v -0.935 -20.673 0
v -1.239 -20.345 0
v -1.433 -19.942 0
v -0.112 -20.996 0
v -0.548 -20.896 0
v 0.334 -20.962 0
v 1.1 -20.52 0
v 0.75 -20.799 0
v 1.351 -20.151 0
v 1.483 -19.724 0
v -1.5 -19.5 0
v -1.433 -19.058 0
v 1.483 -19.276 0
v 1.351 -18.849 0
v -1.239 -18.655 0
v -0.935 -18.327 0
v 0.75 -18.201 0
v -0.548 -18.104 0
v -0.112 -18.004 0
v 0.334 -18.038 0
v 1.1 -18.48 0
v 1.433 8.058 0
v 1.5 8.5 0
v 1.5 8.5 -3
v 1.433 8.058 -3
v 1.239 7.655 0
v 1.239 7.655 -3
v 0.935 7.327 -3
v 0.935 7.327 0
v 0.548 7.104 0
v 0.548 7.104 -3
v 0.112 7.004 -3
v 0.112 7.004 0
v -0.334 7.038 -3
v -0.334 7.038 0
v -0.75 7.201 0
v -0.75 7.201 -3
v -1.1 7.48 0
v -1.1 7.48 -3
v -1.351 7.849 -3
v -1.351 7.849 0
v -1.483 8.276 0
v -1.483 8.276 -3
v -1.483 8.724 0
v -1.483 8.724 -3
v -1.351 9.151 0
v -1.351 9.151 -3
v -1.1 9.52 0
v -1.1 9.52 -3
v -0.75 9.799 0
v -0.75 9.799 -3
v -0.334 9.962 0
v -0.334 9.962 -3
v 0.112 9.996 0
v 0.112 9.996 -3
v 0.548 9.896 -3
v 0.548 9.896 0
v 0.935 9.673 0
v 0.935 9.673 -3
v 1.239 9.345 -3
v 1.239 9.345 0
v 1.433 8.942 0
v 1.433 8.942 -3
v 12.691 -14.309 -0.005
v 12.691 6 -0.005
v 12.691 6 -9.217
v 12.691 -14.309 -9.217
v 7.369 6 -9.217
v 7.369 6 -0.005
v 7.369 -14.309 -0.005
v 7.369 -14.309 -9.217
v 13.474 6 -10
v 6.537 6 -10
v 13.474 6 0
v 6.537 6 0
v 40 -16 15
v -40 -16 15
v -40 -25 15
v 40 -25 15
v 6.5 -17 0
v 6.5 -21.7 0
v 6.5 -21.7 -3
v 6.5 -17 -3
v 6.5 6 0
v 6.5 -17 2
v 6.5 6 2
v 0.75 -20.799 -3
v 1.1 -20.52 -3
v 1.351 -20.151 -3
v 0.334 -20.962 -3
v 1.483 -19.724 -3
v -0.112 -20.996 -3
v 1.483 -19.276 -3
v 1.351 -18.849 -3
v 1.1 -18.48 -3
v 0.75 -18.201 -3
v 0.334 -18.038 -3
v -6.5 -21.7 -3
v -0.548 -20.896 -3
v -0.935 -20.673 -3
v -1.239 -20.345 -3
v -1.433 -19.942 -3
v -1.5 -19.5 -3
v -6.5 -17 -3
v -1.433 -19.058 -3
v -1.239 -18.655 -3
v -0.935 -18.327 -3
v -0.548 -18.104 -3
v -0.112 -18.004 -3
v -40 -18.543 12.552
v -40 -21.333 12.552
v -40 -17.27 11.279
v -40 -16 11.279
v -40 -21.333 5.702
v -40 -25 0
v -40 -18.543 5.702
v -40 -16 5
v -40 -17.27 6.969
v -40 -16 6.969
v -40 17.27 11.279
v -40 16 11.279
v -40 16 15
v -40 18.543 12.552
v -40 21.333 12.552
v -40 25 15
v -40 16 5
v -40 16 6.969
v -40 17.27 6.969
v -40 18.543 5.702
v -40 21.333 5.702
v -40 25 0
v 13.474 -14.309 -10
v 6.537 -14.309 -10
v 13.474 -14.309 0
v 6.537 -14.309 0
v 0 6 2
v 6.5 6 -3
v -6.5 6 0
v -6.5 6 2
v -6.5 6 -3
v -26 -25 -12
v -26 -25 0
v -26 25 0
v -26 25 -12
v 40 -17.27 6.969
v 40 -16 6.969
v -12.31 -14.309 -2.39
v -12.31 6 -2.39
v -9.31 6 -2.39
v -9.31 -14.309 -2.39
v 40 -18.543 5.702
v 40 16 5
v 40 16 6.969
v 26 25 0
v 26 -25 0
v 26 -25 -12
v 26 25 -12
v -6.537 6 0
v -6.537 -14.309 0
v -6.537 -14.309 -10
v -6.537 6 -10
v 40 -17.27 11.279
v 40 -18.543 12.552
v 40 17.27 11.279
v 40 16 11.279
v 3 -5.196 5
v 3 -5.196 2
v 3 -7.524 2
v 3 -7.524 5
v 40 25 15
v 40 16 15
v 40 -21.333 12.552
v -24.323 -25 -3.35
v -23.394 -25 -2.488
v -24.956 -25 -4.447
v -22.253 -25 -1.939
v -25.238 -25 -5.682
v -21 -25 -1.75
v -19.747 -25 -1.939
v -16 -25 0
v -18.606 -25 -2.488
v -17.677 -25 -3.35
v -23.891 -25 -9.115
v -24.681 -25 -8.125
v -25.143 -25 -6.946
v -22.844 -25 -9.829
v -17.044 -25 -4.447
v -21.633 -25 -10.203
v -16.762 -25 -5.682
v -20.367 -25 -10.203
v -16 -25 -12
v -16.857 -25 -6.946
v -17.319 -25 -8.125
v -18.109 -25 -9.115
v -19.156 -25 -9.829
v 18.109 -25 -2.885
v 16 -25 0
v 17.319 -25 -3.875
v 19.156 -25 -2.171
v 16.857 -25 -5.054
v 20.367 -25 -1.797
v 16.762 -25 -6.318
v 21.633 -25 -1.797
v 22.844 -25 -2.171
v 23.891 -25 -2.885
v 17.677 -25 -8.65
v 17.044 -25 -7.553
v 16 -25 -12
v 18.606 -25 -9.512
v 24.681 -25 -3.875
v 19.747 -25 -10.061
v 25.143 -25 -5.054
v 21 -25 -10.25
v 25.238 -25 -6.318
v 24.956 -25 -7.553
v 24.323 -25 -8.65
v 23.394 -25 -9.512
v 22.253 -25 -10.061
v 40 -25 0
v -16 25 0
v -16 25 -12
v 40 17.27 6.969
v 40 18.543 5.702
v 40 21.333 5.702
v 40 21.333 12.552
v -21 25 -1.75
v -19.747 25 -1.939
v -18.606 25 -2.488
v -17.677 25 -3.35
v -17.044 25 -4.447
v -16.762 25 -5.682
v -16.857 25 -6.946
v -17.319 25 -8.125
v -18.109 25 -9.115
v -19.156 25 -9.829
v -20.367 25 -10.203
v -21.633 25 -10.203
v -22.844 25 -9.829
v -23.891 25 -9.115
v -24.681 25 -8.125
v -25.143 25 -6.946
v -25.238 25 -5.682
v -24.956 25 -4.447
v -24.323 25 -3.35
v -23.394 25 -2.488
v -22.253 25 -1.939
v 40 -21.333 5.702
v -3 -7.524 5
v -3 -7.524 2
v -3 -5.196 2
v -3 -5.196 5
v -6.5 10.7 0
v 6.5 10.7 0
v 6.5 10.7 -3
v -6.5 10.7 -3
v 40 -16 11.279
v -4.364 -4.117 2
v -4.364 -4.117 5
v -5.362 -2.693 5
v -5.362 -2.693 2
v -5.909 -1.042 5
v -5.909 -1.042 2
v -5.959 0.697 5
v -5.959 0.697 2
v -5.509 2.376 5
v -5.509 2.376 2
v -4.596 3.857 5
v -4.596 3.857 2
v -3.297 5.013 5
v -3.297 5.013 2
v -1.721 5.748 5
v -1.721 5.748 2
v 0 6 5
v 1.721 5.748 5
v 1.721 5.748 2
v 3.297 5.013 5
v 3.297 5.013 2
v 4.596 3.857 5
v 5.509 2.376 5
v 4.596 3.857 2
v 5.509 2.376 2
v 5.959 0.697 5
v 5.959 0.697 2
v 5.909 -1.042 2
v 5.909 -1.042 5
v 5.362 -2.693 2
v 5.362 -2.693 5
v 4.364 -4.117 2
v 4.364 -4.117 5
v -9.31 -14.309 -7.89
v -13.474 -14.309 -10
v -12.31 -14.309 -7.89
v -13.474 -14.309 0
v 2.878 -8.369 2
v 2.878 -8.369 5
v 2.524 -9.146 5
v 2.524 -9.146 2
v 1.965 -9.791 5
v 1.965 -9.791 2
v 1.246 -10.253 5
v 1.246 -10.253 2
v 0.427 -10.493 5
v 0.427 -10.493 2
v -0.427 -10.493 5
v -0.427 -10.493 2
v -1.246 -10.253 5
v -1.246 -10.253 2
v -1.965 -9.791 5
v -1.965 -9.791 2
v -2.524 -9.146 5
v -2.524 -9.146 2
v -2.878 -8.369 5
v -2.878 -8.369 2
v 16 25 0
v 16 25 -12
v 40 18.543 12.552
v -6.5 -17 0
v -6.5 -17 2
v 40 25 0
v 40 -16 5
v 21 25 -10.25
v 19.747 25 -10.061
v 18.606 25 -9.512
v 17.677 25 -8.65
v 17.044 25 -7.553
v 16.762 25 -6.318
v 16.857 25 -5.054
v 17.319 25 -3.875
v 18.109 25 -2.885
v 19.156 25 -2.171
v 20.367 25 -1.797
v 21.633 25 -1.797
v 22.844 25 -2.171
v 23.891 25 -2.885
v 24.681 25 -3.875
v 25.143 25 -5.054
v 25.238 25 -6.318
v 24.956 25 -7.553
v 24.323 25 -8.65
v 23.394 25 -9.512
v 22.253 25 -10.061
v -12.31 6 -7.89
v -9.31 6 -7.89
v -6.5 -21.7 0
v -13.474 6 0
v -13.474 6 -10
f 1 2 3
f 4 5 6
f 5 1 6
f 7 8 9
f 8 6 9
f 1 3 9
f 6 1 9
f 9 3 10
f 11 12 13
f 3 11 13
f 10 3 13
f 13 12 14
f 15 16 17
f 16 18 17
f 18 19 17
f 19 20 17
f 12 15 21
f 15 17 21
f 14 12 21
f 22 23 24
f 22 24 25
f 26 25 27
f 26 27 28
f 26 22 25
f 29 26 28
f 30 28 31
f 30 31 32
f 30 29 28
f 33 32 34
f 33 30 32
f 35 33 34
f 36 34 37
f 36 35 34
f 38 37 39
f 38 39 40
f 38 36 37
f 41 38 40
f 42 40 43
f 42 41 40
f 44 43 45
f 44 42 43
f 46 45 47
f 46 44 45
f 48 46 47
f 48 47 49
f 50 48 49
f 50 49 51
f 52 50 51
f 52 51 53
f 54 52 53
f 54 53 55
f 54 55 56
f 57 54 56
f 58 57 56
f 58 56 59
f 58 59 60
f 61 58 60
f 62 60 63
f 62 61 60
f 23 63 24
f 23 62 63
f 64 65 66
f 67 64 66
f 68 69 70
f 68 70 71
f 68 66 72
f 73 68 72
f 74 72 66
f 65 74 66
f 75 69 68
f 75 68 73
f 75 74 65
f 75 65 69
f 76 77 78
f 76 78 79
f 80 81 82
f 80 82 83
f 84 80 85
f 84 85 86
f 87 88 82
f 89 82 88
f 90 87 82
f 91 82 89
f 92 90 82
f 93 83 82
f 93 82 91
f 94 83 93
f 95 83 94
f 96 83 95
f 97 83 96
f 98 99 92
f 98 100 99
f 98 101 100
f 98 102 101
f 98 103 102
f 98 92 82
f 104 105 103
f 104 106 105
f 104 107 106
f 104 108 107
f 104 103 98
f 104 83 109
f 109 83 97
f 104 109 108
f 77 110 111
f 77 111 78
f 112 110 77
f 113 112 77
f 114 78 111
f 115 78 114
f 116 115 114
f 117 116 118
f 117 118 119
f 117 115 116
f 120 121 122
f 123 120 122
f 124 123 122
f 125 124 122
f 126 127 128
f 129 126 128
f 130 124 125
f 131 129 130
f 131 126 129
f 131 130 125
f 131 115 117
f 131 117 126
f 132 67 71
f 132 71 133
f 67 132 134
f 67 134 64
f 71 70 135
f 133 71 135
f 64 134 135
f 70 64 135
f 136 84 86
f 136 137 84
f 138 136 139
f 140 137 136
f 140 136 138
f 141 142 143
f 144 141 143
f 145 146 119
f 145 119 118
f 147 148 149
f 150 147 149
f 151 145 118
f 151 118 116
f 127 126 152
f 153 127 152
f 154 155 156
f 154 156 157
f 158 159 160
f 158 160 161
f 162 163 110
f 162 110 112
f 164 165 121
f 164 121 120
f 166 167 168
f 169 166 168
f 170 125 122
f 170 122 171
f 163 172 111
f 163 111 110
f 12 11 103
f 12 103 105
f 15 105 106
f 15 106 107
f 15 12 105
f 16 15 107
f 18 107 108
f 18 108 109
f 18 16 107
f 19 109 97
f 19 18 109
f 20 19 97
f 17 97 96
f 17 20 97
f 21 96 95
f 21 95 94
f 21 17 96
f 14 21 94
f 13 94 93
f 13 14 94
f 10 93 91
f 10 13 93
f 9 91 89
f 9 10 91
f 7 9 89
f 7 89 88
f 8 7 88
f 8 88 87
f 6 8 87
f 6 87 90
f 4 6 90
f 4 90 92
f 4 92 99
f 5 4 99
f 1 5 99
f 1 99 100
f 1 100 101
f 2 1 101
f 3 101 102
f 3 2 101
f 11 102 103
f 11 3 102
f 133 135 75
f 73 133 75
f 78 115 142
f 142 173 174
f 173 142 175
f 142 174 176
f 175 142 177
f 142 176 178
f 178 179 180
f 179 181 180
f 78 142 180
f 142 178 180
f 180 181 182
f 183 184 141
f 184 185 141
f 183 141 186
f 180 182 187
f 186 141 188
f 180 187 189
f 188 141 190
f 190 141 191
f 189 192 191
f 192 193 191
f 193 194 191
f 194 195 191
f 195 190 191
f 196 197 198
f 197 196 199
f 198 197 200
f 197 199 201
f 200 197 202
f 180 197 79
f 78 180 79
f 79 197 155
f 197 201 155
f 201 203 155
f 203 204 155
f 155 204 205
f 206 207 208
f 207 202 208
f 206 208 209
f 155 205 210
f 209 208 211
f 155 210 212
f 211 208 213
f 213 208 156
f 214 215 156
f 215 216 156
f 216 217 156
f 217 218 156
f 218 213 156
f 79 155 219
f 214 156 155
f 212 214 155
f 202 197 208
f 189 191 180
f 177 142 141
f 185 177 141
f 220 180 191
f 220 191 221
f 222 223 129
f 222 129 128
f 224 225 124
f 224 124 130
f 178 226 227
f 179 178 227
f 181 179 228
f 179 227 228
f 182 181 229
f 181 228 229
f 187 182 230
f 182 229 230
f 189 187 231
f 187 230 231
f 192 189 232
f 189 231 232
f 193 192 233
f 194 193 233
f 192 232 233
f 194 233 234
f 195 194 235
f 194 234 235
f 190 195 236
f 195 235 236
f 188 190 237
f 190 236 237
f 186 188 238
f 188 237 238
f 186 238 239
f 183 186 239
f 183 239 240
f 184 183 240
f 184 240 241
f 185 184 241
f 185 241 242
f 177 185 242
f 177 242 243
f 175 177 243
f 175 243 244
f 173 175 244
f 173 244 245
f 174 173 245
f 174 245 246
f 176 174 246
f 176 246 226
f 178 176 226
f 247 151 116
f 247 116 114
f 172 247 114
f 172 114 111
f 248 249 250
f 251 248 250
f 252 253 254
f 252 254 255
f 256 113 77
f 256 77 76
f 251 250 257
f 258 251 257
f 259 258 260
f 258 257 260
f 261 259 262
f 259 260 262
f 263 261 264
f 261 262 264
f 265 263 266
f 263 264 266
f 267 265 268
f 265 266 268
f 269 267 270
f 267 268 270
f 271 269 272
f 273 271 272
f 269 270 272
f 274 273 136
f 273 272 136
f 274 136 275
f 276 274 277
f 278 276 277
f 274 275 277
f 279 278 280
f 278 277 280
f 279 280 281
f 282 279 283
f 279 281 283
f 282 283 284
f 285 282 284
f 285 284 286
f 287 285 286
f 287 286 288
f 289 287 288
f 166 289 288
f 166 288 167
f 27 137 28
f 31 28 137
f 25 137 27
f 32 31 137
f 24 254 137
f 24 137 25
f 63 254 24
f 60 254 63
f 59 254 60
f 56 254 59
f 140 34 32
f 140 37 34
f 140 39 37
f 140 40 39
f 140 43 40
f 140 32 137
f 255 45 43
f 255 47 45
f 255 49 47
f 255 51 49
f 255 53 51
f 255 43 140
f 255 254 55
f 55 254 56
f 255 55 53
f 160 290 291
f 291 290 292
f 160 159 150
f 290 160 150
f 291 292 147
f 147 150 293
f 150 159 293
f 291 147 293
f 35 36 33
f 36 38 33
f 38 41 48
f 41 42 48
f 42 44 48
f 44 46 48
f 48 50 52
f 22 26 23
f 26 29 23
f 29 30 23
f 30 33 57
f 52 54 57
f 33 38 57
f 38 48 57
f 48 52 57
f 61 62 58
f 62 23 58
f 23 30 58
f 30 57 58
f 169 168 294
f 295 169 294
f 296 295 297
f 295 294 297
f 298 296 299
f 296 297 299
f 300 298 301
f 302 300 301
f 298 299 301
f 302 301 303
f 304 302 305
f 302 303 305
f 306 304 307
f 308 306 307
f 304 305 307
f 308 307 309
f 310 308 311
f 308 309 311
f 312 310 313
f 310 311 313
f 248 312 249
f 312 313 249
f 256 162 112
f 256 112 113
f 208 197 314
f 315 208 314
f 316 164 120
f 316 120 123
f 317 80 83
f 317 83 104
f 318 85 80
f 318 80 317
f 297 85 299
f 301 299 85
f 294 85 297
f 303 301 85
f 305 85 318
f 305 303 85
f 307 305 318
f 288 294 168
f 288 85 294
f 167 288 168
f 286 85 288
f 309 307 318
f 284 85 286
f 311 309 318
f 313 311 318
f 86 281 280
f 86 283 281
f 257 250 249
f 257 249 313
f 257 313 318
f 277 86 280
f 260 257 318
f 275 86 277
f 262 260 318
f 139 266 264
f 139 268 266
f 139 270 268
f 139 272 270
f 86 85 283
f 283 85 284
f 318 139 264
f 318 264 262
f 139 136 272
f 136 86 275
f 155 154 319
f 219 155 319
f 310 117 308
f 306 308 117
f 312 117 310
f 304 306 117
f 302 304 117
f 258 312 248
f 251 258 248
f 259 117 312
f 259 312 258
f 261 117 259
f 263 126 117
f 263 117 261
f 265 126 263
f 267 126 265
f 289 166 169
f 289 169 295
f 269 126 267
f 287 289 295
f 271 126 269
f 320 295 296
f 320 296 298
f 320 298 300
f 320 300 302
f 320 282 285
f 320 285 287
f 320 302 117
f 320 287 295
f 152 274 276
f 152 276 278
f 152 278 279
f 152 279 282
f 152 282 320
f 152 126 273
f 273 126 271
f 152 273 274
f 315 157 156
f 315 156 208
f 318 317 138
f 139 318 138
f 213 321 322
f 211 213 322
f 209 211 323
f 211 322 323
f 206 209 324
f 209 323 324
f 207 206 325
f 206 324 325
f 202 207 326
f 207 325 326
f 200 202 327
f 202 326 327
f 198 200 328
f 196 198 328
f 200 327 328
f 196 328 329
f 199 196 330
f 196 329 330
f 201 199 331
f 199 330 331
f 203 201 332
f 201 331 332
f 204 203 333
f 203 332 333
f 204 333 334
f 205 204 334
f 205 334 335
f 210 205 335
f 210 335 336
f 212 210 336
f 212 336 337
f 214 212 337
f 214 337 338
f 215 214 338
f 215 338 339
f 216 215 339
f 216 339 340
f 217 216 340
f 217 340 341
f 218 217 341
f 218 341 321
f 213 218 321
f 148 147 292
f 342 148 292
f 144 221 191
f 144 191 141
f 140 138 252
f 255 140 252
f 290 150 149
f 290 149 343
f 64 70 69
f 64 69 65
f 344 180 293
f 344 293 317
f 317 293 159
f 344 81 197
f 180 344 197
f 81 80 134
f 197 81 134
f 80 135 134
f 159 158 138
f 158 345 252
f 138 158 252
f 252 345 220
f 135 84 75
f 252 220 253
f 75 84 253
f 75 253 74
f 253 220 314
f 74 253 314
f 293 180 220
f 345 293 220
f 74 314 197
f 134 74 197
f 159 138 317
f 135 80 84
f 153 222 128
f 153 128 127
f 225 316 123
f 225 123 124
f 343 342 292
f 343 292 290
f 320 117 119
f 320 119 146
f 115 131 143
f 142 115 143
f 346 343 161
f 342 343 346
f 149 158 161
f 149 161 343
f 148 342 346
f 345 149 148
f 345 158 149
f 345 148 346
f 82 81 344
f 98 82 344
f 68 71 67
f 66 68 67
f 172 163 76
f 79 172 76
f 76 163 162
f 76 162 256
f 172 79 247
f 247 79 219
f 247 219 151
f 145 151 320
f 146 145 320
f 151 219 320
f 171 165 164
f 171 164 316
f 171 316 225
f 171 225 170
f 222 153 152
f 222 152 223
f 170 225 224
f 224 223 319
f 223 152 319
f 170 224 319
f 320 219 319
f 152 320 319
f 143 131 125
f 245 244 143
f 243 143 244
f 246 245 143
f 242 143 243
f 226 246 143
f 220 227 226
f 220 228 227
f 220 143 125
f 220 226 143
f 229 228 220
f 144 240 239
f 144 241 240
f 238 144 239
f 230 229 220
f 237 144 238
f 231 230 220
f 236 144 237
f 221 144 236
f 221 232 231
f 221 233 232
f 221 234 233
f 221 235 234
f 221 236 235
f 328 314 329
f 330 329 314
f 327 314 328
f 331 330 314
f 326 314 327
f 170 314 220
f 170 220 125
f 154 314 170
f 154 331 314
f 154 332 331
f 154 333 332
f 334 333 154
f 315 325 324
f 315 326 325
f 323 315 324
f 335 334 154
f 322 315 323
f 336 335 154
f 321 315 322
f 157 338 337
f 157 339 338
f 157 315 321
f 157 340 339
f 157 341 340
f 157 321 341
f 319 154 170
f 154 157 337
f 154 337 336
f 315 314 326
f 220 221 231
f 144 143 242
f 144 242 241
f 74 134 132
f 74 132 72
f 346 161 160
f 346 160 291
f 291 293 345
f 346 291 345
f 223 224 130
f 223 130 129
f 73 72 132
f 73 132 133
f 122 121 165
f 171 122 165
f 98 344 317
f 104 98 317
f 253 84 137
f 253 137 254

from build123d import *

# Parameters (mm, degrees)
SKETCH2_W           = 80
SKETCH2_H           = 50
BOSS_EXTRUDE1_DEPTH = 5
CUT_EXTRUDE1_DEPTH  = 10
SKETCH4_W           = 13
SKETCH4_H           = 23
CUT_EXTRUDE2_DEPTH  = 2
SKETCH6_W           = 13
SKETCH6_H           = 4.7
SKETCH6_R           = 1.5
BOSS_EXTRUDE2_DEPTH = 3
SKETCH10_W          = 80
SKETCH10_H          = 9
BOSS_EXTRUDE5_DEPTH = 10
CUT_EXTRUDE3_DEPTH  = 86.14693183
SKETCH13_W          = 10
SKETCH13_H          = 50
BOSS_EXTRUDE6_DEPTH = 12
SKETCH14_R          = 4.25
CUT_EXTRUDE4_DEPTH  = 66.76473219
SKETCH17_W          = 6.937355762
SKETCH17_H          = 20.309439226
BOSS_EXTRUDE7_DEPTH = 10
SKETCH18_W          = 5.321998735
SKETCH18_H          = 9.21217238
SKETCH18_W_2        = 3
SKETCH18_H_2        = 5.5
CUT_EXTRUDE5_DEPTH  = 53.782572882


with BuildPart() as part:
    # Sketch2 → Boss-Extrude1 (new body)
    with BuildSketch(Plane.XY):
        Rectangle(SKETCH2_W, SKETCH2_H)
    extrude(amount=BOSS_EXTRUDE1_DEPTH)

    # Sketch3 → Cut-Extrude1 (cut)
    with BuildSketch(Plane(origin=(0, 0, 0), x_dir=(-1, 0, 0), z_dir=(0, 0, -1))):
        with BuildLine():
            Line((-3, -5.196152423), (-3, -7.523942422))
            ThreePointArc((-3, -7.523942422), (0, -10.523942422), (3, -7.523942422))
            Line((3, -7.523942422), (3, -5.196152423))
            ThreePointArc((3, -5.196152423), (0, 6), (-3, -5.196152423))
        make_face()
    extrude(amount=-CUT_EXTRUDE1_DEPTH, mode=Mode.SUBTRACT)

    # Sketch4 → Cut-Extrude2 (cut)
    with BuildSketch(Plane(origin=(0, 0, 0), x_dir=(-1, 0, 0), z_dir=(0, 0, -1))):
        with Locations((0, -5.5)):
            Rectangle(SKETCH4_W, SKETCH4_H)
    extrude(amount=-CUT_EXTRUDE2_DEPTH, mode=Mode.SUBTRACT)

    # Sketch6 → Boss-Extrude2 (add)
    # profile 1 of 2: a face of its own
    with BuildSketch(Plane(origin=(0, 0, 0), x_dir=(-1, 0, 0), z_dir=(0, 0, -1))):
        with Locations((0, -19.35)):
            Rectangle(SKETCH6_W, SKETCH6_H)
        with Locations((0, -19.5)):
            Circle(SKETCH6_R, mode=Mode.SUBTRACT)
    # profile 2 of 2: a face of its own
    with BuildSketch(Plane(origin=(0, 0, 0), x_dir=(-1, 0, 0), z_dir=(0, 0, -1))):
        with Locations((0, 8.35)):
            Rectangle(SKETCH6_W, SKETCH6_H)
        with Locations(Location((0, 8.5, 0), (0, 0, 180))):
            Circle(SKETCH6_R, mode=Mode.SUBTRACT)
    extrude(amount=BOSS_EXTRUDE2_DEPTH)

    # Sketch10 → Boss-Extrude5 (add)
    with BuildSketch(Plane.XY.offset(5)):
        with Locations((0, 20.5)):
            Rectangle(SKETCH10_W, SKETCH10_H)
        with Locations((0, -20.5)):
            Rectangle(SKETCH10_W, SKETCH10_H)
    extrude(amount=BOSS_EXTRUDE5_DEPTH)

    # Sketch11 → Cut-Extrude3 (cut, through all)
    with BuildSketch(Plane(origin=(40, 0, 0), x_dir=(0, 0, -1), z_dir=(1, 0, 0))):
        Polygon((-11.279093119, 16), (-11.279093119, 17.27), (-12.551885325, 18.542792206), (-12.551885325, 21.332792206), (-5.701885325, 21.332792206), (-5.701885325, 18.542792206), (-6.969093119, 17.27), (-6.969093119, 16), align=None)
        Polygon((-11.279093119, -16), (-6.969093119, -16), (-6.969093119, -17.27), (-5.701885325, -18.542792206), (-5.701885325, -21.332792206), (-12.551885325, -21.332792206), (-12.551885325, -18.542792206), (-11.279093119, -17.27), align=None)
    extrude(amount=-CUT_EXTRUDE3_DEPTH, mode=Mode.SUBTRACT)

    # Sketch13 → Boss-Extrude6 (add)
    with BuildSketch(Plane(origin=(0, 0, 0), x_dir=(-1, 0, 0), z_dir=(0, 0, -1))):
        with Locations((-21, 0)):
            Rectangle(SKETCH13_W, SKETCH13_H)
        with Locations((21, 0)):
            Rectangle(SKETCH13_W, SKETCH13_H)
    extrude(amount=BOSS_EXTRUDE6_DEPTH)

    # Sketch14 → Cut-Extrude4 (cut, through all)
    with BuildSketch(Plane(origin=(0, 25, 0), x_dir=(1, 0, 0), z_dir=(0, 1, 0))):
        with Locations(Location((-21, 6, 0), (0, 0, 270))):
            Circle(SKETCH14_R)
        with Locations(Location((21, 6, 0), (0, 0, 90))):
            Circle(SKETCH14_R)
    extrude(amount=-CUT_EXTRUDE4_DEPTH, mode=Mode.SUBTRACT)

    # Sketch17 → Boss-Extrude7 (add)
    with BuildSketch(Plane(origin=(0, 0, 0), x_dir=(-1, 0, 0), z_dir=(0, 0, -1))):
        with Locations((10.005383819, -4.154719613)):
            Rectangle(SKETCH17_W, SKETCH17_H)
        with Locations((-10.005383819, -4.154719613)):
            Rectangle(SKETCH17_W, SKETCH17_H)
    extrude(amount=BOSS_EXTRUDE7_DEPTH)

    # Sketch18 → Cut-Extrude5 (cut, through all)
    with BuildSketch(Plane(origin=(0, 6, 0), x_dir=(1, 0, 0), z_dir=(0, 1, 0))):
        with Locations((10.030343861, 4.611072031)):
            Rectangle(SKETCH18_W, SKETCH18_H)
        with Locations((-10.810103866, 5.140004806)):
            Rectangle(SKETCH18_W_2, SKETCH18_H_2)
    extrude(amount=-CUT_EXTRUDE5_DEPTH, mode=Mode.SUBTRACT)


solid = part.part
